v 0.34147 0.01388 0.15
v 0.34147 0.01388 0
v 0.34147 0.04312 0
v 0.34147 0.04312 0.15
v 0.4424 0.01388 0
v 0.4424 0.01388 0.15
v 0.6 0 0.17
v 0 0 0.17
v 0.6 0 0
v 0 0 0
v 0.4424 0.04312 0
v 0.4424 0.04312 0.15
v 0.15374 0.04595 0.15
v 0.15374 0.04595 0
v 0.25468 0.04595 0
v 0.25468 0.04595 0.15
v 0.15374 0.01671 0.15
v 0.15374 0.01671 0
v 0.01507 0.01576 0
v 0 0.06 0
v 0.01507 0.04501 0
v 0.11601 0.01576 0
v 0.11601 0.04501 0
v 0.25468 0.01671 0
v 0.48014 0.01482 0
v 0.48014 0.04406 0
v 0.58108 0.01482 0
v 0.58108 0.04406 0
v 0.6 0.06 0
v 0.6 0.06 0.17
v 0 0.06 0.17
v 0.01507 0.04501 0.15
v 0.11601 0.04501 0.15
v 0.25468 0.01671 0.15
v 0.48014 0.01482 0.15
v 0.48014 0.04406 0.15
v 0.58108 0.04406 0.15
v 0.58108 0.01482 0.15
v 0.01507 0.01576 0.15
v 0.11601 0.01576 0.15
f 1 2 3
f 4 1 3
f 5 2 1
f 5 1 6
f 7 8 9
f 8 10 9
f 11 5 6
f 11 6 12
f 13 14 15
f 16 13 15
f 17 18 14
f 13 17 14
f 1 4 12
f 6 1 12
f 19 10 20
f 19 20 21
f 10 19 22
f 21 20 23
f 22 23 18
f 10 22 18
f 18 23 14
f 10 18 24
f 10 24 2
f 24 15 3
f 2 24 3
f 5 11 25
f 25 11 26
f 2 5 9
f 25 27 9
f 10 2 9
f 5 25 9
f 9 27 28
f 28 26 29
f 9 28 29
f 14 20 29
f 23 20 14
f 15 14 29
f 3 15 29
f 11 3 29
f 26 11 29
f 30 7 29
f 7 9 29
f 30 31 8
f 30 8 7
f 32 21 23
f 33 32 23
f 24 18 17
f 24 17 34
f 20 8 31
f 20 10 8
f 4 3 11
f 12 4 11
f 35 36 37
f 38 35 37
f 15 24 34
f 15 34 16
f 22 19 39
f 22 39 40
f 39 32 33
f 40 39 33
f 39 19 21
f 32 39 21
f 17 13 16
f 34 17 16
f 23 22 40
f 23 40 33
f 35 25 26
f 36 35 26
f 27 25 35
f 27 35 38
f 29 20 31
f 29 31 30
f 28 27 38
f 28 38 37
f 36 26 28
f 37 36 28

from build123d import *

# Parameters (mm, degrees)
SKETCH1_W           = 0.6
SKETCH1_H           = 0.06
SKETCH1_W_2         = 0.100937657
SKETCH1_H_2         = 0.029243621
SKETCH1_H_3         = 0.02924362
BOSS_EXTRUDE1_DEPTH = 0.15
SKETCH2_W           = 0.6
SKETCH2_H           = 0.06
BOSS_EXTRUDE2_DEPTH = 0.02


with BuildPart() as part:
    # Sketch1 → Boss-Extrude1 (new body)
    with BuildSketch(Plane.XY):
        with Locations((0.3, 0.03)):
            Rectangle(SKETCH1_W, SKETCH1_H)
        with Locations((0.204209788, 0.03132928)):
            Rectangle(SKETCH1_W_2, SKETCH1_H_2, mode=Mode.SUBTRACT)
        with Locations((0.065538428, 0.030385937)):
            Rectangle(SKETCH1_W_2, SKETCH1_H_3, mode=Mode.SUBTRACT)
        with Locations((0.530606325, 0.029442595)):
            Rectangle(SKETCH1_W_2, SKETCH1_H_2, mode=Mode.SUBTRACT)
        with Locations((0.391934965, 0.028499252)):
            Rectangle(SKETCH1_W_2, SKETCH1_H_3, mode=Mode.SUBTRACT)
    extrude(amount=BOSS_EXTRUDE1_DEPTH)

    # Sketch2 → Boss-Extrude2 (add)
    with BuildSketch(Plane.XY.offset(0.15)):
        with Locations((0.3, 0.03)):
            Rectangle(SKETCH2_W, SKETCH2_H)
    extrude(amount=BOSS_EXTRUDE2_DEPTH)


solid = part.part
